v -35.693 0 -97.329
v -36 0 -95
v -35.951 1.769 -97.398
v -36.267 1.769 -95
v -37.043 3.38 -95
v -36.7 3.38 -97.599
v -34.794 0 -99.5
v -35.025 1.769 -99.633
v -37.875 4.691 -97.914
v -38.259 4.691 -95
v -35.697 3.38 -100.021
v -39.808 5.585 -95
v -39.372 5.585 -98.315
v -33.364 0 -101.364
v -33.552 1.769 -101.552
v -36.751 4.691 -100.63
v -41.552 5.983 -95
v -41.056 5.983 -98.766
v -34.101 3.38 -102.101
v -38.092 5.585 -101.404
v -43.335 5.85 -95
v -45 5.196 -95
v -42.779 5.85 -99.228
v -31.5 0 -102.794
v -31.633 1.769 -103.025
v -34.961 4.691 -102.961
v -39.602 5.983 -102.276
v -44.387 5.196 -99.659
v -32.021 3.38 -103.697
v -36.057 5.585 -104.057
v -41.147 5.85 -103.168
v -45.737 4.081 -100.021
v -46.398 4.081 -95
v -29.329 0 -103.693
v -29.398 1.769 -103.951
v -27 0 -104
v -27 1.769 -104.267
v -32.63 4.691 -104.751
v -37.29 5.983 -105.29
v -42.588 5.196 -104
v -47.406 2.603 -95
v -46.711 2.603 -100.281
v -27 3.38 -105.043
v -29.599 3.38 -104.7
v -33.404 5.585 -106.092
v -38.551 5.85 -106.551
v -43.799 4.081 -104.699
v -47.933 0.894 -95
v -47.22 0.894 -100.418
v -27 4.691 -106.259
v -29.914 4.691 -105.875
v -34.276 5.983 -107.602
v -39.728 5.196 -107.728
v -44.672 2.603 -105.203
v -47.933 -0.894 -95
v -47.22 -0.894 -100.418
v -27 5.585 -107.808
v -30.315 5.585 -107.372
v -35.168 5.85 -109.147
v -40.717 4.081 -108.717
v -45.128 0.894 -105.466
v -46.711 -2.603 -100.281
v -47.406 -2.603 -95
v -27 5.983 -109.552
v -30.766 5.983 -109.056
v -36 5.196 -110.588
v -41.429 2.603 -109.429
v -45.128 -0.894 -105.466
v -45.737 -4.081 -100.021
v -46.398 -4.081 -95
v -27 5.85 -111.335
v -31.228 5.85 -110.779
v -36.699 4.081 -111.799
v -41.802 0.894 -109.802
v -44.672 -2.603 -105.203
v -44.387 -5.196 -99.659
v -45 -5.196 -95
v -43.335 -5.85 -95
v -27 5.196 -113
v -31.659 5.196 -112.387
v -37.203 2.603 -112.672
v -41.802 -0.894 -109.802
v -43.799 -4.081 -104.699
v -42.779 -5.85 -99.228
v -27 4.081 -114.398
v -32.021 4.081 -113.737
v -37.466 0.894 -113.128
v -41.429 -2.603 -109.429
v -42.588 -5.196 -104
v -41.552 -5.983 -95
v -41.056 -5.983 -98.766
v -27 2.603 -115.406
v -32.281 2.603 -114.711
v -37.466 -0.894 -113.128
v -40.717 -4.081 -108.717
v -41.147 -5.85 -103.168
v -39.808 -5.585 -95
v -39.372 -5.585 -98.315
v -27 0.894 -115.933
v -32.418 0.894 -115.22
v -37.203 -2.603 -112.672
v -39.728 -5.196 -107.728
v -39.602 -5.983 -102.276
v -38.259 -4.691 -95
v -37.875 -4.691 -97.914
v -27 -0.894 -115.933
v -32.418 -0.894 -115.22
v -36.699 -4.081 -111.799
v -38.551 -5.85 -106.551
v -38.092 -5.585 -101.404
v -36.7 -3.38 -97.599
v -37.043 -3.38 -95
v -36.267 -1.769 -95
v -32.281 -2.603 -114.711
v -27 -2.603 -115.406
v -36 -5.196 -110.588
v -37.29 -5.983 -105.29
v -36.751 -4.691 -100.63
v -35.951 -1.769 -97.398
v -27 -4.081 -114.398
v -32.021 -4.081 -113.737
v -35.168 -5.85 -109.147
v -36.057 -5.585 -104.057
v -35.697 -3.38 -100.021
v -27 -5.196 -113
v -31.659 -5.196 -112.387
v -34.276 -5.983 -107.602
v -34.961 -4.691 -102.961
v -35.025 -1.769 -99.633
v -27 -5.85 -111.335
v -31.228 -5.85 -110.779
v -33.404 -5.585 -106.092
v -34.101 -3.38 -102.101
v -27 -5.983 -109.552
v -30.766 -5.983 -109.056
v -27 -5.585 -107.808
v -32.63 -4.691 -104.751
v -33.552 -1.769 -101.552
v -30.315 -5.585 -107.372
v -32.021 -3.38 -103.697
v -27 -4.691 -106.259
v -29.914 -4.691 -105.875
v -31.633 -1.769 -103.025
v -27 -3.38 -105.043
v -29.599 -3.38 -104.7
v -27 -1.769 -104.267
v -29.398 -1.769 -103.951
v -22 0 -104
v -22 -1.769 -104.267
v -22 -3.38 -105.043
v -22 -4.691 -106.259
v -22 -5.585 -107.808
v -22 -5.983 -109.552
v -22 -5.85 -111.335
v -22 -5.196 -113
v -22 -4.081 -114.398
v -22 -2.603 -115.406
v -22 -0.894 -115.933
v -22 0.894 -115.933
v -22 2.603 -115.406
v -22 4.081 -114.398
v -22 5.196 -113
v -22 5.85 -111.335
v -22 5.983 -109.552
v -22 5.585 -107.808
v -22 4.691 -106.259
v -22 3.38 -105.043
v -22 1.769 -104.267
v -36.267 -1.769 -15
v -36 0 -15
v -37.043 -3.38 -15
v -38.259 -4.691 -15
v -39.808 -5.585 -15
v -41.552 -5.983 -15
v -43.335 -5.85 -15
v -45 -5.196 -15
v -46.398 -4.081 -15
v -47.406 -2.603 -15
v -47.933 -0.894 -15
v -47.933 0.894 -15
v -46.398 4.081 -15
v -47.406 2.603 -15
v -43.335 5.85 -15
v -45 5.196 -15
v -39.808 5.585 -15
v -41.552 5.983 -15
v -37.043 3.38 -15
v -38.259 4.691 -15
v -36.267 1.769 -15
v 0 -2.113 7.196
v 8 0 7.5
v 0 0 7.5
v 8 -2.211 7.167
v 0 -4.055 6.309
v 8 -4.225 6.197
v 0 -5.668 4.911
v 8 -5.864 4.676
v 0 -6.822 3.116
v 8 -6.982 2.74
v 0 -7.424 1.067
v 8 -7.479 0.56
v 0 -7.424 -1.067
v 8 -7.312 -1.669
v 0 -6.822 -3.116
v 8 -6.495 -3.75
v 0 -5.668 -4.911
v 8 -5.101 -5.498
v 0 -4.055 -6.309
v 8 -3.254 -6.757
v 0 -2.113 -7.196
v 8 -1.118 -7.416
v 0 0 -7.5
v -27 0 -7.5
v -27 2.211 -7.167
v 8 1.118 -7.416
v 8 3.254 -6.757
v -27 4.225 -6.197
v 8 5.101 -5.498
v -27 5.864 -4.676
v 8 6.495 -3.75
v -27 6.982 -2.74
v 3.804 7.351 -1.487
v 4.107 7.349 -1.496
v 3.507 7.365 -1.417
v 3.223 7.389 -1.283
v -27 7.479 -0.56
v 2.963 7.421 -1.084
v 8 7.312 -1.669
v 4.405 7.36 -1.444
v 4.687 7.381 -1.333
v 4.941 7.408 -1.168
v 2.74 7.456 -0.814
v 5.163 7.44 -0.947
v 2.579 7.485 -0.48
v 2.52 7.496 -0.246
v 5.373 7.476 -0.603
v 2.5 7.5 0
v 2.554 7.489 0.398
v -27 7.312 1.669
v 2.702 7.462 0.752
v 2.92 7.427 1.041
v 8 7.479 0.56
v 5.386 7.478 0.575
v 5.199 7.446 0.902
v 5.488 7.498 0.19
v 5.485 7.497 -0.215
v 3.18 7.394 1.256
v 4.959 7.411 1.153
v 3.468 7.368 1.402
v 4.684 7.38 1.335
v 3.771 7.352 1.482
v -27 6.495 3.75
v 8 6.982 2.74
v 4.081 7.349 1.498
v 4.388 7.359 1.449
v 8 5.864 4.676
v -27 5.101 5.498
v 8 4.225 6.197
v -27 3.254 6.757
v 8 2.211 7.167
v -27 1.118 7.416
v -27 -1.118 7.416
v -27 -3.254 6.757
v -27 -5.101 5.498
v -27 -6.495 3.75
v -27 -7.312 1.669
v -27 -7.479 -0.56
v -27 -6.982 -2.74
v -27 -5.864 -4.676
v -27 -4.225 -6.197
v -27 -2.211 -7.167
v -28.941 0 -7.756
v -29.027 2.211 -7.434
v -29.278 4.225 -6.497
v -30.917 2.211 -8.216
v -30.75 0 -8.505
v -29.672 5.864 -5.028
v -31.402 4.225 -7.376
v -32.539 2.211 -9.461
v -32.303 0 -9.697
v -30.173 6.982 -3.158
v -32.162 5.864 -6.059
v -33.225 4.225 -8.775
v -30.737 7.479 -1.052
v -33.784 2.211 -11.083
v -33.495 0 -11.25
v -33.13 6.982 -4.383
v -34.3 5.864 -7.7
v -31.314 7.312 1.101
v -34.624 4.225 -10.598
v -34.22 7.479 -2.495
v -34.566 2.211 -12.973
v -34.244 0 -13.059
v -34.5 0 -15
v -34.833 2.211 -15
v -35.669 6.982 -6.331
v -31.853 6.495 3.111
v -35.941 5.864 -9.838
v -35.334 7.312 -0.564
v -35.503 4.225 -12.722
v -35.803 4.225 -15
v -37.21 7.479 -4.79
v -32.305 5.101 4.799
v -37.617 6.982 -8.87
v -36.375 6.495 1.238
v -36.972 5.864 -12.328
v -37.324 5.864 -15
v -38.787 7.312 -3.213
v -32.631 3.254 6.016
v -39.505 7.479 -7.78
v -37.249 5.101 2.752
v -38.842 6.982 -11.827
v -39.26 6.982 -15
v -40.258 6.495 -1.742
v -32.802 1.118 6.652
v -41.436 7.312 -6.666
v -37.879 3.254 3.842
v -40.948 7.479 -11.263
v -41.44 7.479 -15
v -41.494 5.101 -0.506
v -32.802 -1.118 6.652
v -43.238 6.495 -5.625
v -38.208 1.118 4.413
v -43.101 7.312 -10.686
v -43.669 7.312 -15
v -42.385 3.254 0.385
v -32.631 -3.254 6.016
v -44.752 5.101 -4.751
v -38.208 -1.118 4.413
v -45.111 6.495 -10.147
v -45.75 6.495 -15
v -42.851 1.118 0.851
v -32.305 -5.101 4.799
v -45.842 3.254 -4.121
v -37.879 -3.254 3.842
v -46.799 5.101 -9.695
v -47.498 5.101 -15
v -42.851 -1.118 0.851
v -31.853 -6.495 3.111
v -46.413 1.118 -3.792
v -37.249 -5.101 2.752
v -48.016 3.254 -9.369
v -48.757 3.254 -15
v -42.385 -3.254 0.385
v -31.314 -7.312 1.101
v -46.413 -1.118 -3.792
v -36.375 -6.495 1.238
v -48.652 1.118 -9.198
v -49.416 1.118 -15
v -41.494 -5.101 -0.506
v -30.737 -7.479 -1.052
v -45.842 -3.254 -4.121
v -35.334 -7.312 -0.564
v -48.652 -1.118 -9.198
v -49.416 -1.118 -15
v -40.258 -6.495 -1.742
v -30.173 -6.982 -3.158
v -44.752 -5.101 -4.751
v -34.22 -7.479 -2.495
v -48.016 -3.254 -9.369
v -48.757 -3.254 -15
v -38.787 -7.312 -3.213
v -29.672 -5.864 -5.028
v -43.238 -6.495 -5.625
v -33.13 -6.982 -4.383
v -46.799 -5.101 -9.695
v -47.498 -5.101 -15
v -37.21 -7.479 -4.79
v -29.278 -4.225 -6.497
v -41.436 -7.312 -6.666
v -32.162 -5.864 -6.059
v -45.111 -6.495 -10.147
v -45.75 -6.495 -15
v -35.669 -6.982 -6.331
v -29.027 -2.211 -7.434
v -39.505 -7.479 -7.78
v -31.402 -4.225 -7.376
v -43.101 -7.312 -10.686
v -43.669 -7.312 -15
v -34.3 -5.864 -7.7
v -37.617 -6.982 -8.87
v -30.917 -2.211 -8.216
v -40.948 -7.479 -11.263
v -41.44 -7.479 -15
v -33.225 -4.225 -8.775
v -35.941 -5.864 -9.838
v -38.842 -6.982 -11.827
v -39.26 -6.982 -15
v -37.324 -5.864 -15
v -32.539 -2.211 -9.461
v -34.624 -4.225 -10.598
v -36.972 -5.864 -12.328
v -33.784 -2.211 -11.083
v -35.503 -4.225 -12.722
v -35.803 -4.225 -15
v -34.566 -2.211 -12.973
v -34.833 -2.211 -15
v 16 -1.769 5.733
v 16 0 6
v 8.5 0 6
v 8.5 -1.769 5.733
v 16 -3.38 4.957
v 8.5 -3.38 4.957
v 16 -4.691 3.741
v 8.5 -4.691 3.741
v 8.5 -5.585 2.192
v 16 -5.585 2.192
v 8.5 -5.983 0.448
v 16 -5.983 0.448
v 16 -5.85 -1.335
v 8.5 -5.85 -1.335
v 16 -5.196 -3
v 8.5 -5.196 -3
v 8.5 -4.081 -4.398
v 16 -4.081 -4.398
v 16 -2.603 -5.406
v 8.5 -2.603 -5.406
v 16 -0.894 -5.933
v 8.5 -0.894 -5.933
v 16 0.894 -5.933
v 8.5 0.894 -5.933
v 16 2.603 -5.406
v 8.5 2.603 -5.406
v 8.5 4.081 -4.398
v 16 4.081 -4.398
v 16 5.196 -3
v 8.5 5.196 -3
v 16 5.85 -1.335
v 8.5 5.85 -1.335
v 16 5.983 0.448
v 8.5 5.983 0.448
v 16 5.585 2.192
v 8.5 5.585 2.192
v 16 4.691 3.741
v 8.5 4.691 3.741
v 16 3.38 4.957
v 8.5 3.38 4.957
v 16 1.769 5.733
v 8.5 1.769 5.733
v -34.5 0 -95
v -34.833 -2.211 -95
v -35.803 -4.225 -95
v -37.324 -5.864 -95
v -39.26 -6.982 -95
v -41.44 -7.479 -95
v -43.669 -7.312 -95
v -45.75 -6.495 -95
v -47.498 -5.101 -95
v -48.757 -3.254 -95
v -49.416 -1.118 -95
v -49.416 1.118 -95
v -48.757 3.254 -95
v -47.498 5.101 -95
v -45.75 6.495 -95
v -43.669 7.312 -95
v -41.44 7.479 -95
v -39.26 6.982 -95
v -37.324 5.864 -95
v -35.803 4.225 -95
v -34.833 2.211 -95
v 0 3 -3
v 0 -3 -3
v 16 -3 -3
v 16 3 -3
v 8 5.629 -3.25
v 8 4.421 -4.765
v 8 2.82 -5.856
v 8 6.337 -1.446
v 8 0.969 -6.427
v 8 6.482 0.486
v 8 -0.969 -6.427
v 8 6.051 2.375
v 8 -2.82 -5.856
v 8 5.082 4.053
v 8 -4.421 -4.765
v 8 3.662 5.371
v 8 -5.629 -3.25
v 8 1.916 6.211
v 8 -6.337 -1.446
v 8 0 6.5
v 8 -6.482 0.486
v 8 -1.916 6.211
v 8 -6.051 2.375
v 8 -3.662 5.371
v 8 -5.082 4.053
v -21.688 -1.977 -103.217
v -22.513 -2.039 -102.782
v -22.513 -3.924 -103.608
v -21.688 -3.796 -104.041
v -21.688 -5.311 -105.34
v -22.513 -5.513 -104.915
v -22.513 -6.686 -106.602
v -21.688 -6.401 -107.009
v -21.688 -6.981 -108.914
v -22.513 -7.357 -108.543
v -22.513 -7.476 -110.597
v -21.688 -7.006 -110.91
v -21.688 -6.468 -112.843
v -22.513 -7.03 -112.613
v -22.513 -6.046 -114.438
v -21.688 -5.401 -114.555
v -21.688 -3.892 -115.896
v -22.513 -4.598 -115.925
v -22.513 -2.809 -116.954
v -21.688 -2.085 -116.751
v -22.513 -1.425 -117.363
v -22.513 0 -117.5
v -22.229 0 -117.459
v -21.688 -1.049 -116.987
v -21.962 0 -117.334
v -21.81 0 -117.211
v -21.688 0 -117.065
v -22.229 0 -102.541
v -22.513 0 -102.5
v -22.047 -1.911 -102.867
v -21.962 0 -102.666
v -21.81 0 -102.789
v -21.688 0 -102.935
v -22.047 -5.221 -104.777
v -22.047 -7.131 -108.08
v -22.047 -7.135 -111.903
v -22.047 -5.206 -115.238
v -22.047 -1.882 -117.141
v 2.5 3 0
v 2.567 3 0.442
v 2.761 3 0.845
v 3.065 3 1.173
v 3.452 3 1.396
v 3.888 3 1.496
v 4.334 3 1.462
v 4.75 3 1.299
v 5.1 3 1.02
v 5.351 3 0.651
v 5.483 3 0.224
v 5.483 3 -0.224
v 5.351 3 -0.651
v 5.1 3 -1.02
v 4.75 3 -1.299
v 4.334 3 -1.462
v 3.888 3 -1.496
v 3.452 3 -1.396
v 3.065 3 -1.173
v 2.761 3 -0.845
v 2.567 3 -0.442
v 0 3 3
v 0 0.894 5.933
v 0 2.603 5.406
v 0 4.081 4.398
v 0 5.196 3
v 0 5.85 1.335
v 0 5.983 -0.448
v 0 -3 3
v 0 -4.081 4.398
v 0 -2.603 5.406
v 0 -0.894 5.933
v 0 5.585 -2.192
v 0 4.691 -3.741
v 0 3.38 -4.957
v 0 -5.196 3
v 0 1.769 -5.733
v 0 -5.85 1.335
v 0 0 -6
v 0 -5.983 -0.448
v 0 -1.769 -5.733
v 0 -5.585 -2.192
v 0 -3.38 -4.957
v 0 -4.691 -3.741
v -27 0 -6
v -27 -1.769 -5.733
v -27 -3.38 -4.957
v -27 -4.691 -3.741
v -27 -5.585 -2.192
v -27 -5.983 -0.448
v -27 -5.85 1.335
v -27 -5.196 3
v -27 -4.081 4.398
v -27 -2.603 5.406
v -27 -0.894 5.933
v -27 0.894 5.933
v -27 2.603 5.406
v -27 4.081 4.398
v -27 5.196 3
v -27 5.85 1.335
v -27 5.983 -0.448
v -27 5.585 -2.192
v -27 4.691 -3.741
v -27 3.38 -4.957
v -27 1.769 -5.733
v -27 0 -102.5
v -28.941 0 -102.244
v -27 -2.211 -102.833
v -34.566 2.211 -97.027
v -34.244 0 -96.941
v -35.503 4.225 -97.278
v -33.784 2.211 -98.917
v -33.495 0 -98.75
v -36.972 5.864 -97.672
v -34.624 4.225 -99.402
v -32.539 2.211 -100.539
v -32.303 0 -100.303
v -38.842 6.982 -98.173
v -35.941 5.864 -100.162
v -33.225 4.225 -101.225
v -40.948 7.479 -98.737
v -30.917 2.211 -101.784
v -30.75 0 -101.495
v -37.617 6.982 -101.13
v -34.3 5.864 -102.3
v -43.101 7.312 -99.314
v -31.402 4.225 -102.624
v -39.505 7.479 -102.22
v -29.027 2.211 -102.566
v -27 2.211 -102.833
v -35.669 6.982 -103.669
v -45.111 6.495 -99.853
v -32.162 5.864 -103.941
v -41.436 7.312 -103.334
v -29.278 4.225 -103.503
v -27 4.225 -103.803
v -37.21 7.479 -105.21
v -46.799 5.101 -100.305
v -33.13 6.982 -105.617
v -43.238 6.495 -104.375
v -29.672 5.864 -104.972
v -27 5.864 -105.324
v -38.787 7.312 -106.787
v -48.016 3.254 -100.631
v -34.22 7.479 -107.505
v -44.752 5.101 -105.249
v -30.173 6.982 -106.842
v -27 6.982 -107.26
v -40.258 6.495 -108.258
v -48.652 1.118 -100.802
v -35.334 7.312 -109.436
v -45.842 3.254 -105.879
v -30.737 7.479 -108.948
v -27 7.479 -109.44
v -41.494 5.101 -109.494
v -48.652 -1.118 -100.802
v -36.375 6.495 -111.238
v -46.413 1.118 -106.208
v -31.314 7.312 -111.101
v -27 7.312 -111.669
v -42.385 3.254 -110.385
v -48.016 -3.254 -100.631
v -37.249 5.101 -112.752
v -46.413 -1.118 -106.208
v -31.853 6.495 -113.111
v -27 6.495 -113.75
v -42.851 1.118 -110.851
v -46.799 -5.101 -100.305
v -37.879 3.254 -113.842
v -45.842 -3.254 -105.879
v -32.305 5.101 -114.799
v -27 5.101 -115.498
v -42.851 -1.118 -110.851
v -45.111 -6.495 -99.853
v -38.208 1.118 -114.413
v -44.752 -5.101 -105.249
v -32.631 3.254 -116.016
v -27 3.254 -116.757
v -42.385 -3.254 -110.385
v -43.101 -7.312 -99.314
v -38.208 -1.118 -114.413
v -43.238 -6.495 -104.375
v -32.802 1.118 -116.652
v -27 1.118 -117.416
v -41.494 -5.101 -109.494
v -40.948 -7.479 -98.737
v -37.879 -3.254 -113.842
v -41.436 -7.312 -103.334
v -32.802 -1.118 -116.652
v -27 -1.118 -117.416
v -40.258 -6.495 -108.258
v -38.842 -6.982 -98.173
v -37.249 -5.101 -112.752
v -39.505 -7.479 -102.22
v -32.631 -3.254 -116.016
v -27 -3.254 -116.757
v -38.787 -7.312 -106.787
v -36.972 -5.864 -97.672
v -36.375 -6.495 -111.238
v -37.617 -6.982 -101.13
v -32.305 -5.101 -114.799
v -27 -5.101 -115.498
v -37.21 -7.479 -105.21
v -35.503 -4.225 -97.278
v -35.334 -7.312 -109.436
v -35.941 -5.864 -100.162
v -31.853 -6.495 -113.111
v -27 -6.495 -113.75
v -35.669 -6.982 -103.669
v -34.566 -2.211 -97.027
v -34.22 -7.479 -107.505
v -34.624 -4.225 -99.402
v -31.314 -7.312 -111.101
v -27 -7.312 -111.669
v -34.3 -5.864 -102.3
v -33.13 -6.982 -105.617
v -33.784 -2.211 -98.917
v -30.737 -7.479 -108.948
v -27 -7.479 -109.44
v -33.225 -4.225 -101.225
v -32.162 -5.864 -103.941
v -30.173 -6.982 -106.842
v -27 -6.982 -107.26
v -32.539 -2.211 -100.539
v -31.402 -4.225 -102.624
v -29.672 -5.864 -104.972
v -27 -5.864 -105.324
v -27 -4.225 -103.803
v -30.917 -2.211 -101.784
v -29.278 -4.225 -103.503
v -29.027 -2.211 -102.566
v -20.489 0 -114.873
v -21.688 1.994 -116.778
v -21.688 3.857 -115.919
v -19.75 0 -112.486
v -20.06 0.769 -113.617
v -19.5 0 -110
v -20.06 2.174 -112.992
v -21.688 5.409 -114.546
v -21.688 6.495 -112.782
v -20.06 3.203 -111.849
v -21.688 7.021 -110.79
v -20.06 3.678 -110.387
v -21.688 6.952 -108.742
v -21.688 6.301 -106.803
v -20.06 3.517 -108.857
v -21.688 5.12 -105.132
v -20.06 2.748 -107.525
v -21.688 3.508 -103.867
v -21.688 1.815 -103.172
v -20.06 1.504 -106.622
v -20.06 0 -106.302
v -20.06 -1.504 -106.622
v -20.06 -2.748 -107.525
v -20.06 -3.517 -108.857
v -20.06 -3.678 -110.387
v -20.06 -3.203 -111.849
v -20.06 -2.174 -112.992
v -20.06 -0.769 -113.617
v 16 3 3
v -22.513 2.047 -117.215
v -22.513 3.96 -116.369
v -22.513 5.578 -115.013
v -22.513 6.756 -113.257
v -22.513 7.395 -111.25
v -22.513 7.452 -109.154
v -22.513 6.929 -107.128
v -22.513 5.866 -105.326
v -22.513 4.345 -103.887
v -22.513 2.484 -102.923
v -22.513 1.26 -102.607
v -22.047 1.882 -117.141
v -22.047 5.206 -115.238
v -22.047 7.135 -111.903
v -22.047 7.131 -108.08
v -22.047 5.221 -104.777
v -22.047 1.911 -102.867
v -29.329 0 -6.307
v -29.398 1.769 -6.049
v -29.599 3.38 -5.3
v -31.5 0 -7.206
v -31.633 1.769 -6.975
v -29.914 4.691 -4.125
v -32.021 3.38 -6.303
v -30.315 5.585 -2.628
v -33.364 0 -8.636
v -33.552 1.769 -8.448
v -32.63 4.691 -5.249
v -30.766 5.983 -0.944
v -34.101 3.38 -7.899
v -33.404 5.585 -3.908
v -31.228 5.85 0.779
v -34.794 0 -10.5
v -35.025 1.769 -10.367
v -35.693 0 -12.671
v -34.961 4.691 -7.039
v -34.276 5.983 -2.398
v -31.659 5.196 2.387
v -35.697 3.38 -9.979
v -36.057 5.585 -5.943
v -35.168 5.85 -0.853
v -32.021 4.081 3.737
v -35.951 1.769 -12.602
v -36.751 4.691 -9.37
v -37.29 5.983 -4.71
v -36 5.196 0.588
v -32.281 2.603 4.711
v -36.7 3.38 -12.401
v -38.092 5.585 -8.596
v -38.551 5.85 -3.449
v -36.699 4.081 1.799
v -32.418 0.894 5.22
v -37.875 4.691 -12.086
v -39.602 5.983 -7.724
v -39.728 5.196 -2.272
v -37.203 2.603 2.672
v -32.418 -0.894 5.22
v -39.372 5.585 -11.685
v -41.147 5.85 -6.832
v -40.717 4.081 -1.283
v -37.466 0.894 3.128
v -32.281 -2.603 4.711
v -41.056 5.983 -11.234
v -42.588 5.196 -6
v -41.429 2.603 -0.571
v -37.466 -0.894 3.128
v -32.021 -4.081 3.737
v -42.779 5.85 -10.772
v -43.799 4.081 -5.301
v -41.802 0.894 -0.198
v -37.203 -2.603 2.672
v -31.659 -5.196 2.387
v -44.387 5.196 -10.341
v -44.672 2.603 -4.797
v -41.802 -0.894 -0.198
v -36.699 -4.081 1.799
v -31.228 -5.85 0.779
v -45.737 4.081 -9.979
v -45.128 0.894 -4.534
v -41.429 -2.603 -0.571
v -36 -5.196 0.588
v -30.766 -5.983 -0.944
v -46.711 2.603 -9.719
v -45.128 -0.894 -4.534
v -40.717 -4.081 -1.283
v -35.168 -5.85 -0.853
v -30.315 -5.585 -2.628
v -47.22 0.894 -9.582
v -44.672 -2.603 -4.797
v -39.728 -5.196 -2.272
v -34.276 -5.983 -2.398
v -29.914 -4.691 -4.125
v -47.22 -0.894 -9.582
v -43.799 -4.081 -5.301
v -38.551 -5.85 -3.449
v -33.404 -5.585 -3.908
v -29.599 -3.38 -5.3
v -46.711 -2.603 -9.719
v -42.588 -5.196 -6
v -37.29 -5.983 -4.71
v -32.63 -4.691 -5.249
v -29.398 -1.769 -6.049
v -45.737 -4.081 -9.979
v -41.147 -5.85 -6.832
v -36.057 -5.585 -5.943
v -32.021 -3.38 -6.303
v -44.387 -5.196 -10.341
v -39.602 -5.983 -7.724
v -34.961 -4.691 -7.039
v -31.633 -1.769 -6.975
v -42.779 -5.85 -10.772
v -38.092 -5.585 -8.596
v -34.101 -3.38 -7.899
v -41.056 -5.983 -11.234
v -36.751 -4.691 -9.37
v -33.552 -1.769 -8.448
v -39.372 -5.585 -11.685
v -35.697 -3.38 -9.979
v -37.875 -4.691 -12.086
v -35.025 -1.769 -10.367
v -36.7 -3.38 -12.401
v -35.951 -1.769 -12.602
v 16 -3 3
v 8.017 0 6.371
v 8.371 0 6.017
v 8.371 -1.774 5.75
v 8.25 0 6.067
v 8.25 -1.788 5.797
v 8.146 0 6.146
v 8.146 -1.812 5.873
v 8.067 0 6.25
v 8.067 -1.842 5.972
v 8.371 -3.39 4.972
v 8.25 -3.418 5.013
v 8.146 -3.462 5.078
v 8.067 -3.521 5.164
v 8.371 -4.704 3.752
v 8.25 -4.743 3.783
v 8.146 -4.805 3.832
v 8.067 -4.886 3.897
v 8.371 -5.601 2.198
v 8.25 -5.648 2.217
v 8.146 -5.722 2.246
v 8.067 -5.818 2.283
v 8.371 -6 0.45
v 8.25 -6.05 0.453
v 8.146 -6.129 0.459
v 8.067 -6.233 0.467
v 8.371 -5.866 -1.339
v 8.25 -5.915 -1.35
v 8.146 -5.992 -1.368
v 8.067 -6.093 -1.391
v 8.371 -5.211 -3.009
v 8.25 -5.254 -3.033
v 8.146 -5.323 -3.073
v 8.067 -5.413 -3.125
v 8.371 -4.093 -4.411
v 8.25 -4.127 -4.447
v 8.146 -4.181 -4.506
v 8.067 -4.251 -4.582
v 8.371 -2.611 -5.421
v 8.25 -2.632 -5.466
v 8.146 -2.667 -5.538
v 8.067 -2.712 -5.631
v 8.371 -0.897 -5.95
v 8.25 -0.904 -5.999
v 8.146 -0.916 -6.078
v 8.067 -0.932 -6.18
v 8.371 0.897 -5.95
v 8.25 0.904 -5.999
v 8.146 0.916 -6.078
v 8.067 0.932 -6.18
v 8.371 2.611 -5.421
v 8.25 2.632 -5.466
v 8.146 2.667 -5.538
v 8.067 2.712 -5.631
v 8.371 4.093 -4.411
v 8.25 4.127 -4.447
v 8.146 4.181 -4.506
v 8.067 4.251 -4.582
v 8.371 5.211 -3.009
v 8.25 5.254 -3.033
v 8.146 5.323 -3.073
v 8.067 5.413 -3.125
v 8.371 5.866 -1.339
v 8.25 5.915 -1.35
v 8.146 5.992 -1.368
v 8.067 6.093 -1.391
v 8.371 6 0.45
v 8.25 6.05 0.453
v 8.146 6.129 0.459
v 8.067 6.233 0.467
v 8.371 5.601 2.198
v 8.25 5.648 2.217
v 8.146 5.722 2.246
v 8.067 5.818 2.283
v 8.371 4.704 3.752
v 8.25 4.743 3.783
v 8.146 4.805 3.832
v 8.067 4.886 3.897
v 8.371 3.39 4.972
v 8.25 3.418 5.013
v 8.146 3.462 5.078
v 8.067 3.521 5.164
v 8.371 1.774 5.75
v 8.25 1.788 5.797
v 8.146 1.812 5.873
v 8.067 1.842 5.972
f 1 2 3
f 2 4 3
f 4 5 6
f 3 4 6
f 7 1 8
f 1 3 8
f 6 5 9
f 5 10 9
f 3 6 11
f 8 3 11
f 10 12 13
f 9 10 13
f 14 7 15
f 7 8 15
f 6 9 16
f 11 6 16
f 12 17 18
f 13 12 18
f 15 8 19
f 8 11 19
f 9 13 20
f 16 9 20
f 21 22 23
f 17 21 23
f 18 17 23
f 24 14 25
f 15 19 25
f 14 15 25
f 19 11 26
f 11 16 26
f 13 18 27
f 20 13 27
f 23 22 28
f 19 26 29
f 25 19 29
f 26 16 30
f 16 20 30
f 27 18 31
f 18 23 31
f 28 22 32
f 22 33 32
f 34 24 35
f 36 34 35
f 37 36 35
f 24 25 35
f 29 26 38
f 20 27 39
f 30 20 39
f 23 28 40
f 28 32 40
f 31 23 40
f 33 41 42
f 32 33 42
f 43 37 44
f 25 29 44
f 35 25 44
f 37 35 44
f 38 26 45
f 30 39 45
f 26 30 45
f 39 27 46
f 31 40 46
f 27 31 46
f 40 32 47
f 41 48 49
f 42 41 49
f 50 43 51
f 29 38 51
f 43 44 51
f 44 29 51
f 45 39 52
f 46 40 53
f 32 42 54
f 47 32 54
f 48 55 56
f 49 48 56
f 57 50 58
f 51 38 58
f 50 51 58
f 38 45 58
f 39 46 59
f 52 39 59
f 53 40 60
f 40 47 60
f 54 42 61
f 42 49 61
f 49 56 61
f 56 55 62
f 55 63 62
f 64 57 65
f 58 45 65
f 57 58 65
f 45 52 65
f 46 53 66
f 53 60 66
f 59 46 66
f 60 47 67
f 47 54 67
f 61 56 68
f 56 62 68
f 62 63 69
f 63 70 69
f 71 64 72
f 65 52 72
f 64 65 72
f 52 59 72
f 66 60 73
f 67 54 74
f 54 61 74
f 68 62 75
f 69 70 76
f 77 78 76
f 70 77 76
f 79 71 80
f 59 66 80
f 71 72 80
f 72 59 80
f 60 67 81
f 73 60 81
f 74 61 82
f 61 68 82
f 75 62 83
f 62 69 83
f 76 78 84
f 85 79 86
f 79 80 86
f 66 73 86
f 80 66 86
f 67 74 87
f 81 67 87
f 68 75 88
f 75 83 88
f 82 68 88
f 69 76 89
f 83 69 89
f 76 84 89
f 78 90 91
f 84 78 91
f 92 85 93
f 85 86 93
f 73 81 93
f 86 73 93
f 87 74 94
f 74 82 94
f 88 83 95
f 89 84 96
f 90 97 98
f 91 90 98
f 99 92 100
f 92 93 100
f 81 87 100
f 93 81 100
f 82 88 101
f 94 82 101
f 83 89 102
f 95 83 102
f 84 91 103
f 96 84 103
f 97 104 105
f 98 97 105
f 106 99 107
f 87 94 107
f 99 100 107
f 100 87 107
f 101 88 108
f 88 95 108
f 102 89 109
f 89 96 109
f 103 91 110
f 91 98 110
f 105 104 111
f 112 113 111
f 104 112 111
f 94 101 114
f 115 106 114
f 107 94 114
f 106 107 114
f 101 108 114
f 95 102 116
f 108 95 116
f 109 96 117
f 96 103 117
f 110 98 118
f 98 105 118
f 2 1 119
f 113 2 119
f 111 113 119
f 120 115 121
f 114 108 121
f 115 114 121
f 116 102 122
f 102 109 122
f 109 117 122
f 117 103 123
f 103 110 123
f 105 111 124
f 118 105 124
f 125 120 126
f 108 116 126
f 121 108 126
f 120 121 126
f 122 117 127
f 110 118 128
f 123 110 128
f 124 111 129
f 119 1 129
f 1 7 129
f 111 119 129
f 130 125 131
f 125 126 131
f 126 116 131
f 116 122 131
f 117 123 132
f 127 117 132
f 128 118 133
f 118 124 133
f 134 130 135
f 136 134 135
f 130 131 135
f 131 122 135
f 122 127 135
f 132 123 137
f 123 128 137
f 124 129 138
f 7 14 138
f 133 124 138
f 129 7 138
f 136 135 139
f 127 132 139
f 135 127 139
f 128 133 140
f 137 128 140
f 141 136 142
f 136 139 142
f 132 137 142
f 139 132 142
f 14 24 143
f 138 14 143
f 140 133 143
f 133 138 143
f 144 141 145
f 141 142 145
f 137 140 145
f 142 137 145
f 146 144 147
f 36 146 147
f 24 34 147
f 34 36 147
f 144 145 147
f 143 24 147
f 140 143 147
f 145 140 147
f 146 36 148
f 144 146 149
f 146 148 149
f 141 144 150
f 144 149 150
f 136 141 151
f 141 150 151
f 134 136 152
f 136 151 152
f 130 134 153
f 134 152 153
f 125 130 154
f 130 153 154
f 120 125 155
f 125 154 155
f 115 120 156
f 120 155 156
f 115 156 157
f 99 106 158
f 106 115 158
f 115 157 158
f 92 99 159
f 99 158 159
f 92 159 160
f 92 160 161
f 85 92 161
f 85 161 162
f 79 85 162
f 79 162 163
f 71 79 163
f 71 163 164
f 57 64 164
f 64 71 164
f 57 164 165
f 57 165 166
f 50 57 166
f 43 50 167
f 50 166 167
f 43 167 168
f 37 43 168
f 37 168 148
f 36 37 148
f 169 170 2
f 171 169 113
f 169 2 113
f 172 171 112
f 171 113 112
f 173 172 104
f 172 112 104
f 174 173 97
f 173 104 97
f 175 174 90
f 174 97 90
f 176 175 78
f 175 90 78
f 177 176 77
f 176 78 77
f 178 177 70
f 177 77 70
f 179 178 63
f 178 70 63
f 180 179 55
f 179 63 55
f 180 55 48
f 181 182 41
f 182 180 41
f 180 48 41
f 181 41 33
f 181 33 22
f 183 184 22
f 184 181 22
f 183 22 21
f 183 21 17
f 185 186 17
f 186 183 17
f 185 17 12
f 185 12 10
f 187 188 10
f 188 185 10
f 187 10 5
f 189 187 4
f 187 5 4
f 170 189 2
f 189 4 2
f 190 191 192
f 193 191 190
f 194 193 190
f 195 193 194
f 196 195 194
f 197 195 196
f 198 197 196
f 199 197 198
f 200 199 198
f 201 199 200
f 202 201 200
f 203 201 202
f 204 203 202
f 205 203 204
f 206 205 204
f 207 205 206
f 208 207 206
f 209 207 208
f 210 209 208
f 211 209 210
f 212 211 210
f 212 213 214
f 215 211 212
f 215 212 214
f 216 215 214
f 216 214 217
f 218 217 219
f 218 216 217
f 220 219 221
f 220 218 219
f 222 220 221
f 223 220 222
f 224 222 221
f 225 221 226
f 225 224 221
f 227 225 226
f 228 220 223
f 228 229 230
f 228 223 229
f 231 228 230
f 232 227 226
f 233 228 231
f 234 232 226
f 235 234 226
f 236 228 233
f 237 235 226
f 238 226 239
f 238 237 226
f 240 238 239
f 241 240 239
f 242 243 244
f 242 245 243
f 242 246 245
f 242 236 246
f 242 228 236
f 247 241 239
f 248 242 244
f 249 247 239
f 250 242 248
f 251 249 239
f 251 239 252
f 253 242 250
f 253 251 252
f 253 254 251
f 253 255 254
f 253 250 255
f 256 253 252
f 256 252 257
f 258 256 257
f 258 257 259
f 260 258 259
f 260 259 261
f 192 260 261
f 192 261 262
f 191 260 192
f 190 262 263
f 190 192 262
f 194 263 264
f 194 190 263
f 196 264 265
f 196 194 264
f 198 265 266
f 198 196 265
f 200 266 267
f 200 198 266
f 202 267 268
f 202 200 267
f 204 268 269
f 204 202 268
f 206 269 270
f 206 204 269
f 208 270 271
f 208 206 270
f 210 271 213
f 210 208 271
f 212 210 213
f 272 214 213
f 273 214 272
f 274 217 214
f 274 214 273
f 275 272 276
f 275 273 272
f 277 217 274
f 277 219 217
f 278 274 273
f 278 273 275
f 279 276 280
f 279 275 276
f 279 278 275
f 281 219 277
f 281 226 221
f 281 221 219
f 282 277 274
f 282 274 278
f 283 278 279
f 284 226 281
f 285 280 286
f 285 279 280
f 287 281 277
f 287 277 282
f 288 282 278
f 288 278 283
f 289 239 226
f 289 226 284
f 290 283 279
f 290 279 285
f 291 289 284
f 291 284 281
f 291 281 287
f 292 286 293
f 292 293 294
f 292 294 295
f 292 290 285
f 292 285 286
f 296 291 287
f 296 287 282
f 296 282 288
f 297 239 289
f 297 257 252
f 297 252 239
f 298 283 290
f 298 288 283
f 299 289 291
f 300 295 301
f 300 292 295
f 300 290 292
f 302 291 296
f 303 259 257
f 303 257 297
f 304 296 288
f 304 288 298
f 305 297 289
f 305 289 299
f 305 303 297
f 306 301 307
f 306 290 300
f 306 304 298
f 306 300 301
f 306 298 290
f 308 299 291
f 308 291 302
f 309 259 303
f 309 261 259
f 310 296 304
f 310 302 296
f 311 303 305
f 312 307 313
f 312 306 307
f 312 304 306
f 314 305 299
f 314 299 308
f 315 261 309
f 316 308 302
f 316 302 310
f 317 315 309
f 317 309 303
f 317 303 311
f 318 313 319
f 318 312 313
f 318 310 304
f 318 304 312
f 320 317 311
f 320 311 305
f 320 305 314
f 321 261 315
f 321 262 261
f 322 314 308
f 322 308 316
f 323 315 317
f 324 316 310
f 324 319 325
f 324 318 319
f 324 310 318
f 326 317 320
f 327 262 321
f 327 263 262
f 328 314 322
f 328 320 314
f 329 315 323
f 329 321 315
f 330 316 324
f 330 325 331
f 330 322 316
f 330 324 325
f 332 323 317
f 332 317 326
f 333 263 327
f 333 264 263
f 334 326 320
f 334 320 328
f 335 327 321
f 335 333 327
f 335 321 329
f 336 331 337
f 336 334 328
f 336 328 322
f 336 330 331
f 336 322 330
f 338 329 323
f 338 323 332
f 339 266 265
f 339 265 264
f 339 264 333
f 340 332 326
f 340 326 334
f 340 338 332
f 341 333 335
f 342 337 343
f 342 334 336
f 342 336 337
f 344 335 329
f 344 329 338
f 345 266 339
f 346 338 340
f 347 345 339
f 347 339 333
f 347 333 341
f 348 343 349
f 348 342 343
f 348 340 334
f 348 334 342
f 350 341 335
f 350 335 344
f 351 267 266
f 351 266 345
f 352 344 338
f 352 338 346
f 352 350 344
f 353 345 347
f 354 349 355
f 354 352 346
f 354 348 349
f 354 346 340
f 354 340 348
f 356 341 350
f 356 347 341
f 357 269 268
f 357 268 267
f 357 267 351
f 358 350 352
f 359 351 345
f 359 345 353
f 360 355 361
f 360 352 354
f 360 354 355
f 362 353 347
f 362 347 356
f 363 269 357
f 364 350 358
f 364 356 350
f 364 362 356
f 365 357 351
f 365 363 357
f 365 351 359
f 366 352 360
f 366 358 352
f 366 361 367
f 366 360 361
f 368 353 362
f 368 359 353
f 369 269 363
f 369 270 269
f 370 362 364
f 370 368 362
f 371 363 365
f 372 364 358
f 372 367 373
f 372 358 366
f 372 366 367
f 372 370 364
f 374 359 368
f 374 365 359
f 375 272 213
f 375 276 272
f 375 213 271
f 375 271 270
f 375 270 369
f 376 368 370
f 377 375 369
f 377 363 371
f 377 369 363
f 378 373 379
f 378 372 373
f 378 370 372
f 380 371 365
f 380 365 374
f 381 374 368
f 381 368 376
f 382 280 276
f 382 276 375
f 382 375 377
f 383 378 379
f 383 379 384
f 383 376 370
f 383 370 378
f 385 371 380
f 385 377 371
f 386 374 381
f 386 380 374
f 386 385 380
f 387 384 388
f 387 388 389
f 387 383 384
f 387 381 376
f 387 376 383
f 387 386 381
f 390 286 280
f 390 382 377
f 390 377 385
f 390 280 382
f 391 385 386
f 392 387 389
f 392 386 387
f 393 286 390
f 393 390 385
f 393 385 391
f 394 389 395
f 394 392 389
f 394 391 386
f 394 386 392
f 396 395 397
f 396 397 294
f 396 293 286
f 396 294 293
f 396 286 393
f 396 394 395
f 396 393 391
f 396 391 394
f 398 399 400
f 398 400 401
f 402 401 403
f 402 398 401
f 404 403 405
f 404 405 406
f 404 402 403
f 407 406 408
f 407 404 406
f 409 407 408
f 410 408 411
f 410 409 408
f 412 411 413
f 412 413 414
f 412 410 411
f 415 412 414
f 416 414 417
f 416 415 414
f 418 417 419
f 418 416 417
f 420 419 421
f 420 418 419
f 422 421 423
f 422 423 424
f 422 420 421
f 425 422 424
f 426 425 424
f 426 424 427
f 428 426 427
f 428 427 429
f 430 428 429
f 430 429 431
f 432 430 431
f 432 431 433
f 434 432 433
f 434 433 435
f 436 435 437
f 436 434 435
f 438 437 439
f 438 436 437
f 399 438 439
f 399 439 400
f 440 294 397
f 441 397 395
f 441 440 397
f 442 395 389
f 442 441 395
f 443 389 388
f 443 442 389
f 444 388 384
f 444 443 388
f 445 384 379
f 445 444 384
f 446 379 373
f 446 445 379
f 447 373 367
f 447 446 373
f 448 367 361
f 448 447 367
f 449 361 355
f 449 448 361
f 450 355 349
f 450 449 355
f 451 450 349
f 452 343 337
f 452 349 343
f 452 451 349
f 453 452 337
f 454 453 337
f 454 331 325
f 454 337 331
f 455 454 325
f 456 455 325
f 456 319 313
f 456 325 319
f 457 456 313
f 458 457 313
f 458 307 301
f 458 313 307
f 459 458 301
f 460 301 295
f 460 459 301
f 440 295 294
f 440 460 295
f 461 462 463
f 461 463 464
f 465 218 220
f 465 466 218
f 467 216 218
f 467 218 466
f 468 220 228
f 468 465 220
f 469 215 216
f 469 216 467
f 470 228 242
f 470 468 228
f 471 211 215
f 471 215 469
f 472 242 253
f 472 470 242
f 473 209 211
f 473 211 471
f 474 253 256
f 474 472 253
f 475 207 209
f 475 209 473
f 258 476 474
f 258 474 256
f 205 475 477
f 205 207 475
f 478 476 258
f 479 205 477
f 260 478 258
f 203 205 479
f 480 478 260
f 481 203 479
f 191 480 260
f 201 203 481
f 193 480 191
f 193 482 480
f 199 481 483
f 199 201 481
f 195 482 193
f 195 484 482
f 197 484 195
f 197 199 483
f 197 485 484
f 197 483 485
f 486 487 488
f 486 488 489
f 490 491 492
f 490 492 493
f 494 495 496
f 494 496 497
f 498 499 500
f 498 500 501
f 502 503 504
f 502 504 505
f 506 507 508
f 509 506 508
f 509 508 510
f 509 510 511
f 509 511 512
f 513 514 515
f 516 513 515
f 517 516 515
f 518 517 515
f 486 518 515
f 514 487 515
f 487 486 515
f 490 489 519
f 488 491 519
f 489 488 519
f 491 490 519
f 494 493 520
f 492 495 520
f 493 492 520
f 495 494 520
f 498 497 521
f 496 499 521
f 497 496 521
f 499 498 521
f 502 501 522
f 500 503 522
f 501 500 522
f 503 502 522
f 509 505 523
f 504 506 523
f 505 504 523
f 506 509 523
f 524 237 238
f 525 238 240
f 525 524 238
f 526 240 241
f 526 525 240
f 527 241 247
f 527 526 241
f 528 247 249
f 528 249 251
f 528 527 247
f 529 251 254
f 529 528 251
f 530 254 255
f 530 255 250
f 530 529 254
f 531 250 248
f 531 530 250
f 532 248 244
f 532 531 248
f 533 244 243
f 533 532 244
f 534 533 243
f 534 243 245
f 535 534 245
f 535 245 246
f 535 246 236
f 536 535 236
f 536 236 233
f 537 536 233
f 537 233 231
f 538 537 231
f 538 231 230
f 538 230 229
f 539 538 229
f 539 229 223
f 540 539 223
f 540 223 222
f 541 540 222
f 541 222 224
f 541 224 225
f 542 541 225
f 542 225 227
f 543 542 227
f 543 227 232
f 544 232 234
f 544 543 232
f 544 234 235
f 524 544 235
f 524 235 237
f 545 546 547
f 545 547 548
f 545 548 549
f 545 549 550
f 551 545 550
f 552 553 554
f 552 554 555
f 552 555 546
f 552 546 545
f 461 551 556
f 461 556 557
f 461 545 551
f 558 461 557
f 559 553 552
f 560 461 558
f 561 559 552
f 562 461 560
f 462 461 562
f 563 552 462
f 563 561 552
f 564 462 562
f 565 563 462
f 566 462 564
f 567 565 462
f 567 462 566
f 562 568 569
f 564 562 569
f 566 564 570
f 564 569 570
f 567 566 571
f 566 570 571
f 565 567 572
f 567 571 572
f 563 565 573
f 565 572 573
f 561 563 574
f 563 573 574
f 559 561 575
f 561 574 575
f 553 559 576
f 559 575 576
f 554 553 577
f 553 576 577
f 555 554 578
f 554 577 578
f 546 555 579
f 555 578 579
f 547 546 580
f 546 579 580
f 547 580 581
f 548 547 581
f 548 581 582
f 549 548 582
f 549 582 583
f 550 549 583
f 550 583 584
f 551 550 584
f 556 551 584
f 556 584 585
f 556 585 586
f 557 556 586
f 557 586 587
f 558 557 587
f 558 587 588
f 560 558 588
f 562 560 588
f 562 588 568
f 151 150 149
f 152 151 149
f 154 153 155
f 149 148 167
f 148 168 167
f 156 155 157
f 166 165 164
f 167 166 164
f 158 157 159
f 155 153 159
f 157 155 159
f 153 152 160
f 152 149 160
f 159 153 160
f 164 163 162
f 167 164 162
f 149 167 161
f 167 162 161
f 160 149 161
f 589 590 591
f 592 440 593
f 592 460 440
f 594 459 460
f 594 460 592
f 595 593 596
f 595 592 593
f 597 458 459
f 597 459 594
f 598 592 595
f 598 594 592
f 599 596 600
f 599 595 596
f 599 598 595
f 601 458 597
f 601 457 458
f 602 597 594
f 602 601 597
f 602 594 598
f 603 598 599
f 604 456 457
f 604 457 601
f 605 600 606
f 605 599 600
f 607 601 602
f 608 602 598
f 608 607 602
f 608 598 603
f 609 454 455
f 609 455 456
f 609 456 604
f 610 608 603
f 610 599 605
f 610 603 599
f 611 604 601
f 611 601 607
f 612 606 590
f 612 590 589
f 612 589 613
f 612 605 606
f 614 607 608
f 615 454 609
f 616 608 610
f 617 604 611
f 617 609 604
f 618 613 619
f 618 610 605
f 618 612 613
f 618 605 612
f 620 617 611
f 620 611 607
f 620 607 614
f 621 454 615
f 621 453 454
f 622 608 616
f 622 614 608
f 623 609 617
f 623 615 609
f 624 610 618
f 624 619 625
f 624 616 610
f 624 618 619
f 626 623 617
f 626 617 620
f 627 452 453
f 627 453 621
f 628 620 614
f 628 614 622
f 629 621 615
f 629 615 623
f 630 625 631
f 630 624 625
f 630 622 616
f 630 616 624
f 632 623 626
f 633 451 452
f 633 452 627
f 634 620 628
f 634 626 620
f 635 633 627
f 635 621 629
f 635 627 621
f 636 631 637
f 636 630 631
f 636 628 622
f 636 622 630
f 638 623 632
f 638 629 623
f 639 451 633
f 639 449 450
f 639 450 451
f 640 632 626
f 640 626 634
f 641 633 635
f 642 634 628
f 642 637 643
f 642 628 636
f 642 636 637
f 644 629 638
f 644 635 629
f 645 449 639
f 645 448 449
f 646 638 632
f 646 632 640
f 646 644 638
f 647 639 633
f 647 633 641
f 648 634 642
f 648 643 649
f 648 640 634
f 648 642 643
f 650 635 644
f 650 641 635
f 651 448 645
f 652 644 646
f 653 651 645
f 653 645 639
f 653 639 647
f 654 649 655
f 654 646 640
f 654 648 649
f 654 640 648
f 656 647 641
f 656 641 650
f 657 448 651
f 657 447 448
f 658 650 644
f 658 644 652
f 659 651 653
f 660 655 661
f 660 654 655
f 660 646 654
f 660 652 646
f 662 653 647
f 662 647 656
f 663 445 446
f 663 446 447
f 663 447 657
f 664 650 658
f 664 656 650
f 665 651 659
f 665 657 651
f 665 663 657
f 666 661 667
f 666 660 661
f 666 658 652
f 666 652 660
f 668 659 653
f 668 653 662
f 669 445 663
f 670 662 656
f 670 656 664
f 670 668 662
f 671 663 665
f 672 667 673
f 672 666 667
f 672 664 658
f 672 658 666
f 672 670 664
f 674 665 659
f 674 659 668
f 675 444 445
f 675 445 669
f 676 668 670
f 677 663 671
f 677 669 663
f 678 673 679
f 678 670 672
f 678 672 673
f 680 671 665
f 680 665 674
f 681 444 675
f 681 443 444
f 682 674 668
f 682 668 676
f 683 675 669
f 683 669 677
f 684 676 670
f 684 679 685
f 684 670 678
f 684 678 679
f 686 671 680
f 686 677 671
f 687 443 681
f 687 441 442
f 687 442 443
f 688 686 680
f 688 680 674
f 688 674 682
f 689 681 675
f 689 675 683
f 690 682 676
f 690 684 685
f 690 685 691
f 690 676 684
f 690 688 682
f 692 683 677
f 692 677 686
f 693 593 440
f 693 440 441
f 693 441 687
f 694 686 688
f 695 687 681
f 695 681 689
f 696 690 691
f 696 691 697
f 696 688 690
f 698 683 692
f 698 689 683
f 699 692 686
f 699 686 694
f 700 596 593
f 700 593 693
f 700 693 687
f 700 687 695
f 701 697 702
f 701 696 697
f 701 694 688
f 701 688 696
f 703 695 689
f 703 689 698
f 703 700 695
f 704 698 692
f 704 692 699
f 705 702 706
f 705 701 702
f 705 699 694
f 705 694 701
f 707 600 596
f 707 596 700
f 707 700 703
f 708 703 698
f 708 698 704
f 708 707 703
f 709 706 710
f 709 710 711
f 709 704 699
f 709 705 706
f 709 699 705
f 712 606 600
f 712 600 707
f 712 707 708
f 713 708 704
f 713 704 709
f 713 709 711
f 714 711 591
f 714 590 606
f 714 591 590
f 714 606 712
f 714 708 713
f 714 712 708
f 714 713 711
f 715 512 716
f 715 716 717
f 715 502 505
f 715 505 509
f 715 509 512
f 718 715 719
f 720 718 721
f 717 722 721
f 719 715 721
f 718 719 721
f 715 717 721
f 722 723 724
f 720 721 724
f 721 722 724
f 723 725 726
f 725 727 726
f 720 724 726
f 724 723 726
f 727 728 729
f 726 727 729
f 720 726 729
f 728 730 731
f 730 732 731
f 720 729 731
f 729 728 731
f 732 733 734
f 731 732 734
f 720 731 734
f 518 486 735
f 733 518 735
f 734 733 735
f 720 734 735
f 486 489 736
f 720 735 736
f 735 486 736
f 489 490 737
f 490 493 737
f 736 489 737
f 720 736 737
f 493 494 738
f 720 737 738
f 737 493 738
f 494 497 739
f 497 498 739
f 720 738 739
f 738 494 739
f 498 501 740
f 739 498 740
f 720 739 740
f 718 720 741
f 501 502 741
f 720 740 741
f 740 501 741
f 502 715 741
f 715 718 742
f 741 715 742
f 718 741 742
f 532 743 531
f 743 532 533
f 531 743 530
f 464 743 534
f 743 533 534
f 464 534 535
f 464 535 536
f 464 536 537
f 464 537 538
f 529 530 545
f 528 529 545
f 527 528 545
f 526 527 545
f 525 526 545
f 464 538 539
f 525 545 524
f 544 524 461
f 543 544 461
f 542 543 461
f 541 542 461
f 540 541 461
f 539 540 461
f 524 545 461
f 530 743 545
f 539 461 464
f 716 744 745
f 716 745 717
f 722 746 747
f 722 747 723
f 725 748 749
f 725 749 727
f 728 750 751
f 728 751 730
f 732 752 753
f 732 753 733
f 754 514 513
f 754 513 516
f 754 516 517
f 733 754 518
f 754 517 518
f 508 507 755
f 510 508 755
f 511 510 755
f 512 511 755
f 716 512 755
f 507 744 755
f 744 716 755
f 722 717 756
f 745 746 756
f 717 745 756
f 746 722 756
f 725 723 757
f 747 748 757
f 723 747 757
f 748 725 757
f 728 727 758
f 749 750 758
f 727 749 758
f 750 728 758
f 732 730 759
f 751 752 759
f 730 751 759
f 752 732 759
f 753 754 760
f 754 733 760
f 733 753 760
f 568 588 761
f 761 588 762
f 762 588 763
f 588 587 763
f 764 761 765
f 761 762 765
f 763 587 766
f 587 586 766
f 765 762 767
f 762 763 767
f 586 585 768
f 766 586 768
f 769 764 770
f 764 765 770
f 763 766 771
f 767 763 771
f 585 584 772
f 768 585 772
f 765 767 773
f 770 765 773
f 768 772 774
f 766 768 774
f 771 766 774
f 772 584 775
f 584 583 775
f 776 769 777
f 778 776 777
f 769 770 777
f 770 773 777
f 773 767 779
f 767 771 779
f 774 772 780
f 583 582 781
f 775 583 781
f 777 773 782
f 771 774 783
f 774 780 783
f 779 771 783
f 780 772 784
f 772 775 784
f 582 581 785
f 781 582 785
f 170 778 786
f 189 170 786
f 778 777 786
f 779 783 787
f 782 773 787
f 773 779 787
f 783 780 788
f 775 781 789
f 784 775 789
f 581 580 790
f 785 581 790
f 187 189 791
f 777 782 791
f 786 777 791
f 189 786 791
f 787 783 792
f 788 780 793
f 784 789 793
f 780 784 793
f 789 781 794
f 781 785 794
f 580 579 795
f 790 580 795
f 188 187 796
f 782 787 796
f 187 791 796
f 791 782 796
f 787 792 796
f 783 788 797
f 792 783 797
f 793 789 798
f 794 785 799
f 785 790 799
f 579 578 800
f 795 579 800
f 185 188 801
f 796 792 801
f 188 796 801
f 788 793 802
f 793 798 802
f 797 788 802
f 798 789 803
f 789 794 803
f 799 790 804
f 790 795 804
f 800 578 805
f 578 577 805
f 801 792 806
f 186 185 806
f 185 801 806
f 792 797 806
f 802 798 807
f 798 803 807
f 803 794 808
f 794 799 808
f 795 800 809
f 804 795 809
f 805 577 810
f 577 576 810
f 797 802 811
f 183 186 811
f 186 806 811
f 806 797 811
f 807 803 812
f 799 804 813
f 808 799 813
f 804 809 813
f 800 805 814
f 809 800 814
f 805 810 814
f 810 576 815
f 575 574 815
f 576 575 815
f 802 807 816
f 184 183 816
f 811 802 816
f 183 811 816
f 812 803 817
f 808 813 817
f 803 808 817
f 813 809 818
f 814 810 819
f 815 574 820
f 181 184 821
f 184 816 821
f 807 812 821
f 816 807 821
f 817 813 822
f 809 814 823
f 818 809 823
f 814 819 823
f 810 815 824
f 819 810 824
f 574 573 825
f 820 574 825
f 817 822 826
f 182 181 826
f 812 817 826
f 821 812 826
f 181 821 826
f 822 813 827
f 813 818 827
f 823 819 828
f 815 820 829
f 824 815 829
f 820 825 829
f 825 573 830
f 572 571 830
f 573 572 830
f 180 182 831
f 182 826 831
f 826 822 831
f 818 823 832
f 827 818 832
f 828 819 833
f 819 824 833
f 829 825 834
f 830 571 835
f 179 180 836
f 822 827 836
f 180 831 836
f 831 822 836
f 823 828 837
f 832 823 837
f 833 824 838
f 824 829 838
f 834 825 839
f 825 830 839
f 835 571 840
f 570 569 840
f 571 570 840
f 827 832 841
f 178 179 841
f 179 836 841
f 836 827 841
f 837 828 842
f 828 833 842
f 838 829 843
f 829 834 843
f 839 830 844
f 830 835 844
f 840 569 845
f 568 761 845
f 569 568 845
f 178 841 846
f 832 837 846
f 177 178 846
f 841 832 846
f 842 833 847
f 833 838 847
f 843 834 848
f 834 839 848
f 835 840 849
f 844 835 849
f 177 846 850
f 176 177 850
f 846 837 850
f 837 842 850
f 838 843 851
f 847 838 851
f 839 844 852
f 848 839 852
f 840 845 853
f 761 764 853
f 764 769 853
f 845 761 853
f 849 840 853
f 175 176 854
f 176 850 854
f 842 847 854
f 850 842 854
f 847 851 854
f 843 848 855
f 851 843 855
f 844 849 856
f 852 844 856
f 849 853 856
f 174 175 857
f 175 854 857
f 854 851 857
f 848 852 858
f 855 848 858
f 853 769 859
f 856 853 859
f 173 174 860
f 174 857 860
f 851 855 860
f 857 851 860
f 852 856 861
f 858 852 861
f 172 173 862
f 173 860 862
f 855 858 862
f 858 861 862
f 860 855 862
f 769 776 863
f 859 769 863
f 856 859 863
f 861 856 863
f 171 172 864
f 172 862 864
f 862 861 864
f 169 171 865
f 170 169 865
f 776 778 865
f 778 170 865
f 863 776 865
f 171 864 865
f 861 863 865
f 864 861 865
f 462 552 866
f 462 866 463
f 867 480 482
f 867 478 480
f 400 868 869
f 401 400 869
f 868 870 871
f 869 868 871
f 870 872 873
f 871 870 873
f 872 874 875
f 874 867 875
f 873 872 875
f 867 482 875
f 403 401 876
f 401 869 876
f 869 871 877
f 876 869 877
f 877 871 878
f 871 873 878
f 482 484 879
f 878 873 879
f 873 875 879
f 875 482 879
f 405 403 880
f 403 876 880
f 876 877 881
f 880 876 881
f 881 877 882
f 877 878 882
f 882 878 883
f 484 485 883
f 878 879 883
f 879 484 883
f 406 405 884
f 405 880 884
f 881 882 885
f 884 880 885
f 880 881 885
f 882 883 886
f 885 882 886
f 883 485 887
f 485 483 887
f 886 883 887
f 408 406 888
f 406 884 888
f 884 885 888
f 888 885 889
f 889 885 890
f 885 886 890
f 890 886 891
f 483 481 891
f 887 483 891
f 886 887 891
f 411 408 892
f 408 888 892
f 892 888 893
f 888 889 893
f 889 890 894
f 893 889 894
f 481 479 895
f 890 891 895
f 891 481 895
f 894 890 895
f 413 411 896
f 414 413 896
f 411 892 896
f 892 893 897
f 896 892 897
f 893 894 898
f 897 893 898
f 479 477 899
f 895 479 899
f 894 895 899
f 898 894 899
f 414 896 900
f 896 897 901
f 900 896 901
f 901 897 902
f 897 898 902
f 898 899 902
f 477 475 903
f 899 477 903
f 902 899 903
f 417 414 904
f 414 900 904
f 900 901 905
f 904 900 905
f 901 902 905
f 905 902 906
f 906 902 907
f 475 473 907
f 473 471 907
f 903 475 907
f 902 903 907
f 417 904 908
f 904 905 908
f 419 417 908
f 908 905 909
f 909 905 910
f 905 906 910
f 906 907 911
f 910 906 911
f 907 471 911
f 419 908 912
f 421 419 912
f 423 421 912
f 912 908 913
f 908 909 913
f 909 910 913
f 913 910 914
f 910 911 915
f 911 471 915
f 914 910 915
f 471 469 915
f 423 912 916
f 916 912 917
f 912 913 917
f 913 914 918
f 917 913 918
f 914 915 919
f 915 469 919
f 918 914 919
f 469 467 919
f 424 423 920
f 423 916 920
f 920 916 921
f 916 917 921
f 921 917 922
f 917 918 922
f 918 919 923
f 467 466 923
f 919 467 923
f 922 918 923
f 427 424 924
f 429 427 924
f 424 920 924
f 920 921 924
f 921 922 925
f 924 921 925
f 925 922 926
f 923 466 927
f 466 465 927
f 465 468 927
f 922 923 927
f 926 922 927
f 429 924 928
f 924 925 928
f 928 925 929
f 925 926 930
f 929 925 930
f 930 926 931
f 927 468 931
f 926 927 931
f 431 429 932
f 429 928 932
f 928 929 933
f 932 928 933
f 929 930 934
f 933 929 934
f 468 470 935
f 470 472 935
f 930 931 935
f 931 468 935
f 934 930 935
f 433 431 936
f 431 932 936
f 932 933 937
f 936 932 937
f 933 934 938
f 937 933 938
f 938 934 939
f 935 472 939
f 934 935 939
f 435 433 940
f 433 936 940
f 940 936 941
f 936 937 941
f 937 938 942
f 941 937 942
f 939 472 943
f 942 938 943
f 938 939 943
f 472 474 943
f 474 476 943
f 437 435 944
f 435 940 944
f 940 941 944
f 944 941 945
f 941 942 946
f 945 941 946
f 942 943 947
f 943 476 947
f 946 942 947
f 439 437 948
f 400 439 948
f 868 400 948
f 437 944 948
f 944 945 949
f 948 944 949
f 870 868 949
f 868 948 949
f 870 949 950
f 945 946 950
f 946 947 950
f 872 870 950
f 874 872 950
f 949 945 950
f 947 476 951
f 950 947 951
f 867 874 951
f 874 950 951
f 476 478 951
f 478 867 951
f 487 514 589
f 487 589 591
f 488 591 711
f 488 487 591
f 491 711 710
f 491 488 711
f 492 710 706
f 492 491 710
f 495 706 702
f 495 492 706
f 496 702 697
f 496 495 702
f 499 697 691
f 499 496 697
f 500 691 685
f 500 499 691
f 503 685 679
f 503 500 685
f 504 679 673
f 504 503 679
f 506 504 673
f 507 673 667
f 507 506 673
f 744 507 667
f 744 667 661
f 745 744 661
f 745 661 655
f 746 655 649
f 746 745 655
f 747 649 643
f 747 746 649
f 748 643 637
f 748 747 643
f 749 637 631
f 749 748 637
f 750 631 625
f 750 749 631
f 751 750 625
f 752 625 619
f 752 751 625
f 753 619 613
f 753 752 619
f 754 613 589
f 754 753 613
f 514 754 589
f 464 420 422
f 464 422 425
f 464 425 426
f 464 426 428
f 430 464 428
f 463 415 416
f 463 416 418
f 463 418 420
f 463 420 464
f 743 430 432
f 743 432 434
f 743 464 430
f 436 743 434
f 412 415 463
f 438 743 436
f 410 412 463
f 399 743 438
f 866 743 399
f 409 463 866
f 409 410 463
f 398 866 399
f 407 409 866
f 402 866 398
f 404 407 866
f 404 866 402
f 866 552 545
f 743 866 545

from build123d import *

# Parameters (mm, degrees)
SWEEP_THIN1_PROFILE_R   = 7.5
SWEEP_THIN1_PROFILE_R_2 = 6
CUT_EXTRUDE1_DEPTH      = 135.732141815
CUT_EXTRUDE1_DEPTH_BACK = 16
SKETCH65_W              = 6
SKETCH65_H              = 6
FILLET1_R               = 0.5
SKETCH66_R              = 1.5
CUT_EXTRUDE2_DEPTH      = 128.721376578
FILLET2_R               = 1


with BuildPart() as part:
    # Sweep-Thin1: sweep along a path in Sketch1
    with BuildLine(Plane(origin=(0, 0, 0), x_dir=(1, 0, 0), z_dir=(0, 1, 0))) as sweep_thin1_path:
        Line((0, 0), (-27, 0))
        ThreePointArc((-27, 0), (-37.606601718, 4.393398282), (-42, 15))
        Line((-42, 15), (-42, 95))
        ThreePointArc((-42, 95), (-37.606601718, 105.606601718), (-27, 110))
        Line((-27, 110), (-22, 110))
    # Sweep-Thin1 profile (on start of the path) → Sweep-Thin1 (sweep)
    with BuildSketch(Plane(origin=(0, 0, 0), x_dir=(0, 0, -1), z_dir=(-1, 0, 0))):
        Circle(SWEEP_THIN1_PROFILE_R)
        Circle(SWEEP_THIN1_PROFILE_R_2, mode=Mode.SUBTRACT)
    sweep(path=sweep_thin1_path.line)

    # Sketch63 → Revolve1 (revolve)
    with BuildSketch(Plane(origin=(0, 0, 0), x_dir=(1, 0, 0), z_dir=(0, 1, 0))):
        with BuildLine():
            Line((-22, 110), (-19.5, 110))
            ThreePointArc((-19.5, 110), (-20.141458774, 113.952847075), (-22, 117.5))
            Line((-22, 117.5), (-22, 110))
        make_face()
    revolve(axis=Axis((-22, 0, -110), (1, 0, 0)))

    # Sketch64 → Revolve3 (revolve)
    with BuildSketch(Plane(origin=(0, 0, 0), x_dir=(1, 0, 0), z_dir=(0, 1, 0)), mode=Mode.PRIVATE) as revolve3_sk:
        Polygon((0, 3), (0, 7.5), (8, 7.5), (8, 6), (16, 6), (16, 3), align=None)
    revolve(revolve3_sk.sketch.rotate(Axis((0, 0, 0), (1, 0, 0)), 180), axis=Axis((0, 0, 0), (1, 0, 0)))

    # Sketch65 → Cut-Extrude1 (cut, two sides: drawn at the far end of the back side and taken through both)
    with BuildSketch(Plane(origin=(16, 0, 0), x_dir=(0, 0, -1), z_dir=(1, 0, 0)).offset(-CUT_EXTRUDE1_DEPTH_BACK)):
        Rectangle(SKETCH65_W, SKETCH65_H)
    extrude(amount=CUT_EXTRUDE1_DEPTH + CUT_EXTRUDE1_DEPTH_BACK, mode=Mode.SUBTRACT)

    # Fillet1
    fillet1_edges = [part.edges().sort_by_distance(p)[0] for p in [
        (8, 0, -6),
    ]]
    fillet(fillet1_edges, radius=FILLET1_R)

    # Sketch66 → Cut-Extrude2 (cut, through all)
    with BuildSketch(Plane(origin=(0, 0, 0), x_dir=(1, 0, 0), z_dir=(0, 1, 0))):
        with Locations(Location((4, 0, 0), (0, 0, 180))):
            Circle(SKETCH66_R)
    extrude(amount=CUT_EXTRUDE2_DEPTH, mode=Mode.SUBTRACT)

    # Fillet2
    fillet2_edges = [part.edges().sort_by_distance(p)[0] for p in [
        (-22, -7.5, -110),
    ]]
    fillet(fillet2_edges, radius=FILLET2_R)


solid = part.part
